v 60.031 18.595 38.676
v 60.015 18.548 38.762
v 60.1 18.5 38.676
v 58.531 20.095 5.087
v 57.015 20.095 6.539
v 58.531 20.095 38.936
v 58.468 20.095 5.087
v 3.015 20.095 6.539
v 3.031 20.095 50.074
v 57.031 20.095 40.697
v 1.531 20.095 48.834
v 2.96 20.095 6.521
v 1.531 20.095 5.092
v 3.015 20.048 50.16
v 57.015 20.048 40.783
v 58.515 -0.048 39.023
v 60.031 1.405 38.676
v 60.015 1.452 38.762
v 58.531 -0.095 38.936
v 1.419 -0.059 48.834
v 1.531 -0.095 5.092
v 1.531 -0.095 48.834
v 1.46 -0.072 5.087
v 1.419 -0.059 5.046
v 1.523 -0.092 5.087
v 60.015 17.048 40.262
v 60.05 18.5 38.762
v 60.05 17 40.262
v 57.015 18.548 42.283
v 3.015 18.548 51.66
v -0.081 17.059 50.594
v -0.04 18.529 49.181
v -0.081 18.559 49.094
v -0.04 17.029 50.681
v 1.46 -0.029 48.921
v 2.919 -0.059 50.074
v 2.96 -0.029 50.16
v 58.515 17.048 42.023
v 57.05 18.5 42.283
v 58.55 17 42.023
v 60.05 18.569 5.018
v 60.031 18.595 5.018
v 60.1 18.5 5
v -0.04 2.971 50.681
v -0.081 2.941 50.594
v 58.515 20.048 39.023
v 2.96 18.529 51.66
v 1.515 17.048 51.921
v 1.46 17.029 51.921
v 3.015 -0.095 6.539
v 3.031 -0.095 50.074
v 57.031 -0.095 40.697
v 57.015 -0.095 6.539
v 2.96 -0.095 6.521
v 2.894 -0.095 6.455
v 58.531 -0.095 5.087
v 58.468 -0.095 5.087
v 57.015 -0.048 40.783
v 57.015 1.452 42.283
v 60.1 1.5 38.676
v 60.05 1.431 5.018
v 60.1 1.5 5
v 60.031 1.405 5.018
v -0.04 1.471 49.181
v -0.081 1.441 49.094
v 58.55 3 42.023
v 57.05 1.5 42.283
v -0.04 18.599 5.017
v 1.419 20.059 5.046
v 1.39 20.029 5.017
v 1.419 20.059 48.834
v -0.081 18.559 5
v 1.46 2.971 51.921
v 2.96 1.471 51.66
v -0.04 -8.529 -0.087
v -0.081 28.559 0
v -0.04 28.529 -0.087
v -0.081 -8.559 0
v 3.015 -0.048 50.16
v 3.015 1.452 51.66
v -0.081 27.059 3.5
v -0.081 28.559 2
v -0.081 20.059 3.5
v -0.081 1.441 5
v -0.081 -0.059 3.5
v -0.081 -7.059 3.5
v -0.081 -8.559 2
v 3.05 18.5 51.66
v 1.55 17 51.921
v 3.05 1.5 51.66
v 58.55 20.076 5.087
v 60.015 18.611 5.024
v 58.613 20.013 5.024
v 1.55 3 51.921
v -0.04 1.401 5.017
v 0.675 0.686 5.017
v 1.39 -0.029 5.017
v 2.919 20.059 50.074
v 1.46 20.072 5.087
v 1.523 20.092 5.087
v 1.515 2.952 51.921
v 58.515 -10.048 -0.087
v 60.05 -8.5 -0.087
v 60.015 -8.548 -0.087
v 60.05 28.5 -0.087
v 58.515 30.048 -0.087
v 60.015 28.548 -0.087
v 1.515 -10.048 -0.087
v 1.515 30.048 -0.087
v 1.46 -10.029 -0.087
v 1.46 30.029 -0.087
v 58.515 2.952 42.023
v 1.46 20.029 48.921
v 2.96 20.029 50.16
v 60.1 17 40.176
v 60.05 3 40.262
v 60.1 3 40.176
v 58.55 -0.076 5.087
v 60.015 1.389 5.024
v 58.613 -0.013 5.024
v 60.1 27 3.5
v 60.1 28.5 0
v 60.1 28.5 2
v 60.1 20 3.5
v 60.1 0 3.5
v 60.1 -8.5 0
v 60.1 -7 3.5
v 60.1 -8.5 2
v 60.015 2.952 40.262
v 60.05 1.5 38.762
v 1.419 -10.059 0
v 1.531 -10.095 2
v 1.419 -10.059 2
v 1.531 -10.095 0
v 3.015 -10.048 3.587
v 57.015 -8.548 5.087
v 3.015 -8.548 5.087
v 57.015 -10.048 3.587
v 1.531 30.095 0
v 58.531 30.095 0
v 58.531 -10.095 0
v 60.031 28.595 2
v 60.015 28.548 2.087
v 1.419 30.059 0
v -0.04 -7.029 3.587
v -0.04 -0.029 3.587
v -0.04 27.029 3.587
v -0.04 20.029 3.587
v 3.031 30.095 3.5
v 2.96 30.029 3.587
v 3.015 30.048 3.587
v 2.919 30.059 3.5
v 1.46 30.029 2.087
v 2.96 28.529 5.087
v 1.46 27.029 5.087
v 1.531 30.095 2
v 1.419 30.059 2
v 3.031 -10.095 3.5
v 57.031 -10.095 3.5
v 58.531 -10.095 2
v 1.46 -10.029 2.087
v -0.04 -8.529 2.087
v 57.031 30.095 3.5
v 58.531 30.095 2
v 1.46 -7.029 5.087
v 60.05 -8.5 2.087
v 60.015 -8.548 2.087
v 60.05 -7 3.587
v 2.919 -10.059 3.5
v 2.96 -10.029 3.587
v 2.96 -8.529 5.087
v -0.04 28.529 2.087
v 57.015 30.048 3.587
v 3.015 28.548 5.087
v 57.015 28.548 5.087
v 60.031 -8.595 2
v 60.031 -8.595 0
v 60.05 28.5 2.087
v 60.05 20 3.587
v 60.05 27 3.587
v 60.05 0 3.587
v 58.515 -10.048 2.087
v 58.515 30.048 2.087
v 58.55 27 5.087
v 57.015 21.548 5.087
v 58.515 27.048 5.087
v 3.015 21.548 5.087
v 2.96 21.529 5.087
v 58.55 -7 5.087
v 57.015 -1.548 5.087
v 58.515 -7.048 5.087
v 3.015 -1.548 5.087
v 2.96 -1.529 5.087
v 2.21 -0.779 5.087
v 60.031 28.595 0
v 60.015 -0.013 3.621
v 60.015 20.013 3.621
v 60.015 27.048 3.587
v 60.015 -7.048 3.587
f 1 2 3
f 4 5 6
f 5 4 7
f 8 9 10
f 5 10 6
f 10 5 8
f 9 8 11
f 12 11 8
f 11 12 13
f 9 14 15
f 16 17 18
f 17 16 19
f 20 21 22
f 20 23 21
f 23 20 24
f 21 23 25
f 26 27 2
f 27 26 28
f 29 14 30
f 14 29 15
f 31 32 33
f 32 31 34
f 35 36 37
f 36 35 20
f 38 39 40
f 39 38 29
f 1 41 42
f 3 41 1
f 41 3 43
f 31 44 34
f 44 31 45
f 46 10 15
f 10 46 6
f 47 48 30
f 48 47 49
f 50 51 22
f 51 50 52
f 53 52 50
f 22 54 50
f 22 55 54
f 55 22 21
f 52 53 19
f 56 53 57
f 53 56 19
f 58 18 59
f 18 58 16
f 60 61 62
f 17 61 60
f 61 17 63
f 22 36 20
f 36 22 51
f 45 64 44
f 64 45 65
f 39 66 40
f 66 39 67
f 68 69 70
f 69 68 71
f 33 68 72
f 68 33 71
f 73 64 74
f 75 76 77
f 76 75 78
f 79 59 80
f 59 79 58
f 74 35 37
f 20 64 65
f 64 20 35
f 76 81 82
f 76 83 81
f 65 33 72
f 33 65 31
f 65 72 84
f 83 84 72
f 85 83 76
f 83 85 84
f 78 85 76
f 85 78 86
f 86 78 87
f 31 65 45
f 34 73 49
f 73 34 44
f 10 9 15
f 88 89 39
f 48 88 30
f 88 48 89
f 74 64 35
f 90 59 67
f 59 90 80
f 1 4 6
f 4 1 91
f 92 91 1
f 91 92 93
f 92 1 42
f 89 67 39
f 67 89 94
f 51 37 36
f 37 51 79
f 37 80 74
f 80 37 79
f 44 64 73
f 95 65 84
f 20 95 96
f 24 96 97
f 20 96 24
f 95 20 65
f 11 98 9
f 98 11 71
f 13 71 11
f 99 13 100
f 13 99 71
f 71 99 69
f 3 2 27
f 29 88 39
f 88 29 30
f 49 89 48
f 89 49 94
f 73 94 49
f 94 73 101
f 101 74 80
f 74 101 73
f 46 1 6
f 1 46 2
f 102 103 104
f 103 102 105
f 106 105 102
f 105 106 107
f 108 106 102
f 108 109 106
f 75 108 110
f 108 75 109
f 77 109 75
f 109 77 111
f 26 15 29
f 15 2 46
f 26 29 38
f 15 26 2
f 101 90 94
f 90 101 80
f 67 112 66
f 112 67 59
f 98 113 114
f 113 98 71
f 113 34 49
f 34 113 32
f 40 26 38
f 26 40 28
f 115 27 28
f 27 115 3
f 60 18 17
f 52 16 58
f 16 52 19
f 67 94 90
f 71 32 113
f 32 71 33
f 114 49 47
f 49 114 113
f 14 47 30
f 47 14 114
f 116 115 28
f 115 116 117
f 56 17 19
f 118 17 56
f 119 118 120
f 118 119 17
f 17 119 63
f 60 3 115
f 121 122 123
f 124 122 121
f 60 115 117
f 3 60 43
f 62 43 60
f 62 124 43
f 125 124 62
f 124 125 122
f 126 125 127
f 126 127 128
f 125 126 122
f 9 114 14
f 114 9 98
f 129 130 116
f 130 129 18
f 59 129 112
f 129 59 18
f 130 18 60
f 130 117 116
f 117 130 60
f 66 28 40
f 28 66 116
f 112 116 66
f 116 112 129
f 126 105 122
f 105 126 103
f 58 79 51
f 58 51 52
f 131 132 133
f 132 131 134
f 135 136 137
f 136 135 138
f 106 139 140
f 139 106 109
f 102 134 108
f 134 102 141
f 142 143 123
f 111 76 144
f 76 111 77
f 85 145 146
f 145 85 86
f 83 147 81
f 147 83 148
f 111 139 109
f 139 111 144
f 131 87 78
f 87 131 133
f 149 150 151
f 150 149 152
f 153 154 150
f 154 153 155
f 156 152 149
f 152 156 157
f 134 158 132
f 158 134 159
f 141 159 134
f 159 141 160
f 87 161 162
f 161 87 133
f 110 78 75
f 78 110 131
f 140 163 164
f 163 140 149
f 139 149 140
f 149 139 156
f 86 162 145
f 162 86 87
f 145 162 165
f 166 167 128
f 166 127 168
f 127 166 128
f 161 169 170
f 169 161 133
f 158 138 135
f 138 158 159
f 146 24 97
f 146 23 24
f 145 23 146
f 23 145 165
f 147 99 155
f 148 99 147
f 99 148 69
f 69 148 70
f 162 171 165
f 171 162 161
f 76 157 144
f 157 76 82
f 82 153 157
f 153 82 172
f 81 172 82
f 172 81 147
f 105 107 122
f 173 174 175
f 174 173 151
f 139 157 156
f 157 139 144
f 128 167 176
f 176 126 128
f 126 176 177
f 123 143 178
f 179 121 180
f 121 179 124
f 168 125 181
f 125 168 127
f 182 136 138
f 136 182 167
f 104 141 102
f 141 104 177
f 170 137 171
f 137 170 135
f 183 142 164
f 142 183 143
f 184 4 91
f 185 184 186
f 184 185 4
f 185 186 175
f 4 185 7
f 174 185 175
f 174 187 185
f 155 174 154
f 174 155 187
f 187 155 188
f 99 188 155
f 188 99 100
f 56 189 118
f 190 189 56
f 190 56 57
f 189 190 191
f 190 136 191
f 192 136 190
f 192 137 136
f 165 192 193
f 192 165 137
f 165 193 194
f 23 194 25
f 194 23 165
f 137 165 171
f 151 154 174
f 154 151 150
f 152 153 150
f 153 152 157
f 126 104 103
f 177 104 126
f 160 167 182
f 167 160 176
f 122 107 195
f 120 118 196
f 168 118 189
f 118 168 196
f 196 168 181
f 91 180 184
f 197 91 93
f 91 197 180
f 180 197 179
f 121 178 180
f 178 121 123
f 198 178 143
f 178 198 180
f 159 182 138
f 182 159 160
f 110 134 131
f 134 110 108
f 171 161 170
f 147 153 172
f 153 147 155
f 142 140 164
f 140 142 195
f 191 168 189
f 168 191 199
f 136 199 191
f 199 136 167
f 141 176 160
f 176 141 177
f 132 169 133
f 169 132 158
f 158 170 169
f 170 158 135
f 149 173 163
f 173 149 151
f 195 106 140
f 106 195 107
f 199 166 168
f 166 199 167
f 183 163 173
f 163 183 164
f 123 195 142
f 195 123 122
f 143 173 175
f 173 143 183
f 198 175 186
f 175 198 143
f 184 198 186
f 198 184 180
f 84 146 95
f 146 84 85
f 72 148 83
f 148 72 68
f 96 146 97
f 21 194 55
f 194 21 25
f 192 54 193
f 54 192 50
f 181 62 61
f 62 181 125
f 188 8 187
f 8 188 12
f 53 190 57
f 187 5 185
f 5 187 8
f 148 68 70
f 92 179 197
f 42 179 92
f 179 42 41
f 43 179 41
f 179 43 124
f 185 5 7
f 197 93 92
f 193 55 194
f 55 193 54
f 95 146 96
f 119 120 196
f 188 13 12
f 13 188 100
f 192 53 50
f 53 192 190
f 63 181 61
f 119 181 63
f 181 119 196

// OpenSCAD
// Angle to tilt the carboy/bucket
tilt_angle = 10;
// Radius of the carboy or bucket
radius = 150;
// Length of wedge piece
length = 60;
// Width of tall part of wedge
width = 20;
// Bevel size
bevel_size = 1.5;
// Width of the base/stabilizer
base_width = 40;
// height of stabilizer base
base_height = 5;

/* [Hidden] */
angle = tilt_angle;
r = radius;
l = length;
w = width;
b = bevel_size;
basew = base_width;
baseh = base_height;

module bevels(w,h,l,a,b=b) {
  ba = b*sin(a);
  la = l*sin(a);

  x = [0,b,b*2,l-b*2,l-b,l];
  y = [0,b,b*2,w-b*2,w-b,w];
  z = [0,h-b*2,h-b,h];
  zo = [0,-ba,-ba*2,-la+ba*2,-la+ba,-la];

  points = [[x[0],y[1],z[0]+zo[0]],
            [x[0],y[4],z[0]+zo[0]],
            [x[0],y[1],z[1]+zo[0]],
            [x[0],y[4],z[1]+zo[0]],
            [x[0],y[2],z[2]+zo[0]],
            [x[0],y[3],z[2]+zo[0]],
            [x[1],y[0],z[0]+zo[0]],
            [x[1],y[5],z[0]+zo[0]],
            [x[1],y[0],z[1]+zo[1]],
            [x[1],y[5],z[1]+zo[1]],
            [x[1],y[2],z[3]+zo[1]],
            [x[1],y[3],z[3]+zo[1]],
            [x[2],y[0],z[0]+zo[0]],
            [x[2],y[5],z[0]+zo[0]],
            [x[2],y[0],z[2]+zo[2]],
            [x[2],y[5],z[2]+zo[2]],
            [x[2],y[1],z[3]+zo[2]],
            [x[2],y[4],z[3]+zo[2]],
            [x[3],y[0],z[0]+zo[0]],
            [x[3],y[5],z[0]+zo[0]],
            [x[3],y[0],z[2]+zo[3]],
            [x[3],y[5],z[2]+zo[3]],
            [x[3],y[1],z[3]+zo[3]],
            [x[3],y[4],z[3]+zo[3]],
            [x[4],y[0],z[0]+zo[0]],
            [x[4],y[5],z[0]+zo[0]],
            [x[4],y[0],z[1]+zo[4]],
            [x[4],y[5],z[1]+zo[4]],
            [x[4],y[2],z[3]+zo[4]],
            [x[4],y[3],z[3]+zo[4]],
            [x[5],y[1],z[0]+zo[0]],
            [x[5],y[4],z[0]+zo[0]],
            [x[5],y[1],z[1]+zo[5]],
            [x[5],y[4],z[1]+zo[5]],
            [x[5],y[2],z[2]+zo[5]],
            [x[5],y[3],z[2]+zo[5]],
            ];
   hull() {
    for (p = points) {
      translate(p)
      sphere(r=0.1, center=true);
    }
  }
}

bevels(w,r*2*sin(angle),l,angle);
translate([0,-(basew-w)/2])
bevels(basew,baseh,l,0);
translate([0,-b])
bevels(w+b*2,baseh+b,l,0);
